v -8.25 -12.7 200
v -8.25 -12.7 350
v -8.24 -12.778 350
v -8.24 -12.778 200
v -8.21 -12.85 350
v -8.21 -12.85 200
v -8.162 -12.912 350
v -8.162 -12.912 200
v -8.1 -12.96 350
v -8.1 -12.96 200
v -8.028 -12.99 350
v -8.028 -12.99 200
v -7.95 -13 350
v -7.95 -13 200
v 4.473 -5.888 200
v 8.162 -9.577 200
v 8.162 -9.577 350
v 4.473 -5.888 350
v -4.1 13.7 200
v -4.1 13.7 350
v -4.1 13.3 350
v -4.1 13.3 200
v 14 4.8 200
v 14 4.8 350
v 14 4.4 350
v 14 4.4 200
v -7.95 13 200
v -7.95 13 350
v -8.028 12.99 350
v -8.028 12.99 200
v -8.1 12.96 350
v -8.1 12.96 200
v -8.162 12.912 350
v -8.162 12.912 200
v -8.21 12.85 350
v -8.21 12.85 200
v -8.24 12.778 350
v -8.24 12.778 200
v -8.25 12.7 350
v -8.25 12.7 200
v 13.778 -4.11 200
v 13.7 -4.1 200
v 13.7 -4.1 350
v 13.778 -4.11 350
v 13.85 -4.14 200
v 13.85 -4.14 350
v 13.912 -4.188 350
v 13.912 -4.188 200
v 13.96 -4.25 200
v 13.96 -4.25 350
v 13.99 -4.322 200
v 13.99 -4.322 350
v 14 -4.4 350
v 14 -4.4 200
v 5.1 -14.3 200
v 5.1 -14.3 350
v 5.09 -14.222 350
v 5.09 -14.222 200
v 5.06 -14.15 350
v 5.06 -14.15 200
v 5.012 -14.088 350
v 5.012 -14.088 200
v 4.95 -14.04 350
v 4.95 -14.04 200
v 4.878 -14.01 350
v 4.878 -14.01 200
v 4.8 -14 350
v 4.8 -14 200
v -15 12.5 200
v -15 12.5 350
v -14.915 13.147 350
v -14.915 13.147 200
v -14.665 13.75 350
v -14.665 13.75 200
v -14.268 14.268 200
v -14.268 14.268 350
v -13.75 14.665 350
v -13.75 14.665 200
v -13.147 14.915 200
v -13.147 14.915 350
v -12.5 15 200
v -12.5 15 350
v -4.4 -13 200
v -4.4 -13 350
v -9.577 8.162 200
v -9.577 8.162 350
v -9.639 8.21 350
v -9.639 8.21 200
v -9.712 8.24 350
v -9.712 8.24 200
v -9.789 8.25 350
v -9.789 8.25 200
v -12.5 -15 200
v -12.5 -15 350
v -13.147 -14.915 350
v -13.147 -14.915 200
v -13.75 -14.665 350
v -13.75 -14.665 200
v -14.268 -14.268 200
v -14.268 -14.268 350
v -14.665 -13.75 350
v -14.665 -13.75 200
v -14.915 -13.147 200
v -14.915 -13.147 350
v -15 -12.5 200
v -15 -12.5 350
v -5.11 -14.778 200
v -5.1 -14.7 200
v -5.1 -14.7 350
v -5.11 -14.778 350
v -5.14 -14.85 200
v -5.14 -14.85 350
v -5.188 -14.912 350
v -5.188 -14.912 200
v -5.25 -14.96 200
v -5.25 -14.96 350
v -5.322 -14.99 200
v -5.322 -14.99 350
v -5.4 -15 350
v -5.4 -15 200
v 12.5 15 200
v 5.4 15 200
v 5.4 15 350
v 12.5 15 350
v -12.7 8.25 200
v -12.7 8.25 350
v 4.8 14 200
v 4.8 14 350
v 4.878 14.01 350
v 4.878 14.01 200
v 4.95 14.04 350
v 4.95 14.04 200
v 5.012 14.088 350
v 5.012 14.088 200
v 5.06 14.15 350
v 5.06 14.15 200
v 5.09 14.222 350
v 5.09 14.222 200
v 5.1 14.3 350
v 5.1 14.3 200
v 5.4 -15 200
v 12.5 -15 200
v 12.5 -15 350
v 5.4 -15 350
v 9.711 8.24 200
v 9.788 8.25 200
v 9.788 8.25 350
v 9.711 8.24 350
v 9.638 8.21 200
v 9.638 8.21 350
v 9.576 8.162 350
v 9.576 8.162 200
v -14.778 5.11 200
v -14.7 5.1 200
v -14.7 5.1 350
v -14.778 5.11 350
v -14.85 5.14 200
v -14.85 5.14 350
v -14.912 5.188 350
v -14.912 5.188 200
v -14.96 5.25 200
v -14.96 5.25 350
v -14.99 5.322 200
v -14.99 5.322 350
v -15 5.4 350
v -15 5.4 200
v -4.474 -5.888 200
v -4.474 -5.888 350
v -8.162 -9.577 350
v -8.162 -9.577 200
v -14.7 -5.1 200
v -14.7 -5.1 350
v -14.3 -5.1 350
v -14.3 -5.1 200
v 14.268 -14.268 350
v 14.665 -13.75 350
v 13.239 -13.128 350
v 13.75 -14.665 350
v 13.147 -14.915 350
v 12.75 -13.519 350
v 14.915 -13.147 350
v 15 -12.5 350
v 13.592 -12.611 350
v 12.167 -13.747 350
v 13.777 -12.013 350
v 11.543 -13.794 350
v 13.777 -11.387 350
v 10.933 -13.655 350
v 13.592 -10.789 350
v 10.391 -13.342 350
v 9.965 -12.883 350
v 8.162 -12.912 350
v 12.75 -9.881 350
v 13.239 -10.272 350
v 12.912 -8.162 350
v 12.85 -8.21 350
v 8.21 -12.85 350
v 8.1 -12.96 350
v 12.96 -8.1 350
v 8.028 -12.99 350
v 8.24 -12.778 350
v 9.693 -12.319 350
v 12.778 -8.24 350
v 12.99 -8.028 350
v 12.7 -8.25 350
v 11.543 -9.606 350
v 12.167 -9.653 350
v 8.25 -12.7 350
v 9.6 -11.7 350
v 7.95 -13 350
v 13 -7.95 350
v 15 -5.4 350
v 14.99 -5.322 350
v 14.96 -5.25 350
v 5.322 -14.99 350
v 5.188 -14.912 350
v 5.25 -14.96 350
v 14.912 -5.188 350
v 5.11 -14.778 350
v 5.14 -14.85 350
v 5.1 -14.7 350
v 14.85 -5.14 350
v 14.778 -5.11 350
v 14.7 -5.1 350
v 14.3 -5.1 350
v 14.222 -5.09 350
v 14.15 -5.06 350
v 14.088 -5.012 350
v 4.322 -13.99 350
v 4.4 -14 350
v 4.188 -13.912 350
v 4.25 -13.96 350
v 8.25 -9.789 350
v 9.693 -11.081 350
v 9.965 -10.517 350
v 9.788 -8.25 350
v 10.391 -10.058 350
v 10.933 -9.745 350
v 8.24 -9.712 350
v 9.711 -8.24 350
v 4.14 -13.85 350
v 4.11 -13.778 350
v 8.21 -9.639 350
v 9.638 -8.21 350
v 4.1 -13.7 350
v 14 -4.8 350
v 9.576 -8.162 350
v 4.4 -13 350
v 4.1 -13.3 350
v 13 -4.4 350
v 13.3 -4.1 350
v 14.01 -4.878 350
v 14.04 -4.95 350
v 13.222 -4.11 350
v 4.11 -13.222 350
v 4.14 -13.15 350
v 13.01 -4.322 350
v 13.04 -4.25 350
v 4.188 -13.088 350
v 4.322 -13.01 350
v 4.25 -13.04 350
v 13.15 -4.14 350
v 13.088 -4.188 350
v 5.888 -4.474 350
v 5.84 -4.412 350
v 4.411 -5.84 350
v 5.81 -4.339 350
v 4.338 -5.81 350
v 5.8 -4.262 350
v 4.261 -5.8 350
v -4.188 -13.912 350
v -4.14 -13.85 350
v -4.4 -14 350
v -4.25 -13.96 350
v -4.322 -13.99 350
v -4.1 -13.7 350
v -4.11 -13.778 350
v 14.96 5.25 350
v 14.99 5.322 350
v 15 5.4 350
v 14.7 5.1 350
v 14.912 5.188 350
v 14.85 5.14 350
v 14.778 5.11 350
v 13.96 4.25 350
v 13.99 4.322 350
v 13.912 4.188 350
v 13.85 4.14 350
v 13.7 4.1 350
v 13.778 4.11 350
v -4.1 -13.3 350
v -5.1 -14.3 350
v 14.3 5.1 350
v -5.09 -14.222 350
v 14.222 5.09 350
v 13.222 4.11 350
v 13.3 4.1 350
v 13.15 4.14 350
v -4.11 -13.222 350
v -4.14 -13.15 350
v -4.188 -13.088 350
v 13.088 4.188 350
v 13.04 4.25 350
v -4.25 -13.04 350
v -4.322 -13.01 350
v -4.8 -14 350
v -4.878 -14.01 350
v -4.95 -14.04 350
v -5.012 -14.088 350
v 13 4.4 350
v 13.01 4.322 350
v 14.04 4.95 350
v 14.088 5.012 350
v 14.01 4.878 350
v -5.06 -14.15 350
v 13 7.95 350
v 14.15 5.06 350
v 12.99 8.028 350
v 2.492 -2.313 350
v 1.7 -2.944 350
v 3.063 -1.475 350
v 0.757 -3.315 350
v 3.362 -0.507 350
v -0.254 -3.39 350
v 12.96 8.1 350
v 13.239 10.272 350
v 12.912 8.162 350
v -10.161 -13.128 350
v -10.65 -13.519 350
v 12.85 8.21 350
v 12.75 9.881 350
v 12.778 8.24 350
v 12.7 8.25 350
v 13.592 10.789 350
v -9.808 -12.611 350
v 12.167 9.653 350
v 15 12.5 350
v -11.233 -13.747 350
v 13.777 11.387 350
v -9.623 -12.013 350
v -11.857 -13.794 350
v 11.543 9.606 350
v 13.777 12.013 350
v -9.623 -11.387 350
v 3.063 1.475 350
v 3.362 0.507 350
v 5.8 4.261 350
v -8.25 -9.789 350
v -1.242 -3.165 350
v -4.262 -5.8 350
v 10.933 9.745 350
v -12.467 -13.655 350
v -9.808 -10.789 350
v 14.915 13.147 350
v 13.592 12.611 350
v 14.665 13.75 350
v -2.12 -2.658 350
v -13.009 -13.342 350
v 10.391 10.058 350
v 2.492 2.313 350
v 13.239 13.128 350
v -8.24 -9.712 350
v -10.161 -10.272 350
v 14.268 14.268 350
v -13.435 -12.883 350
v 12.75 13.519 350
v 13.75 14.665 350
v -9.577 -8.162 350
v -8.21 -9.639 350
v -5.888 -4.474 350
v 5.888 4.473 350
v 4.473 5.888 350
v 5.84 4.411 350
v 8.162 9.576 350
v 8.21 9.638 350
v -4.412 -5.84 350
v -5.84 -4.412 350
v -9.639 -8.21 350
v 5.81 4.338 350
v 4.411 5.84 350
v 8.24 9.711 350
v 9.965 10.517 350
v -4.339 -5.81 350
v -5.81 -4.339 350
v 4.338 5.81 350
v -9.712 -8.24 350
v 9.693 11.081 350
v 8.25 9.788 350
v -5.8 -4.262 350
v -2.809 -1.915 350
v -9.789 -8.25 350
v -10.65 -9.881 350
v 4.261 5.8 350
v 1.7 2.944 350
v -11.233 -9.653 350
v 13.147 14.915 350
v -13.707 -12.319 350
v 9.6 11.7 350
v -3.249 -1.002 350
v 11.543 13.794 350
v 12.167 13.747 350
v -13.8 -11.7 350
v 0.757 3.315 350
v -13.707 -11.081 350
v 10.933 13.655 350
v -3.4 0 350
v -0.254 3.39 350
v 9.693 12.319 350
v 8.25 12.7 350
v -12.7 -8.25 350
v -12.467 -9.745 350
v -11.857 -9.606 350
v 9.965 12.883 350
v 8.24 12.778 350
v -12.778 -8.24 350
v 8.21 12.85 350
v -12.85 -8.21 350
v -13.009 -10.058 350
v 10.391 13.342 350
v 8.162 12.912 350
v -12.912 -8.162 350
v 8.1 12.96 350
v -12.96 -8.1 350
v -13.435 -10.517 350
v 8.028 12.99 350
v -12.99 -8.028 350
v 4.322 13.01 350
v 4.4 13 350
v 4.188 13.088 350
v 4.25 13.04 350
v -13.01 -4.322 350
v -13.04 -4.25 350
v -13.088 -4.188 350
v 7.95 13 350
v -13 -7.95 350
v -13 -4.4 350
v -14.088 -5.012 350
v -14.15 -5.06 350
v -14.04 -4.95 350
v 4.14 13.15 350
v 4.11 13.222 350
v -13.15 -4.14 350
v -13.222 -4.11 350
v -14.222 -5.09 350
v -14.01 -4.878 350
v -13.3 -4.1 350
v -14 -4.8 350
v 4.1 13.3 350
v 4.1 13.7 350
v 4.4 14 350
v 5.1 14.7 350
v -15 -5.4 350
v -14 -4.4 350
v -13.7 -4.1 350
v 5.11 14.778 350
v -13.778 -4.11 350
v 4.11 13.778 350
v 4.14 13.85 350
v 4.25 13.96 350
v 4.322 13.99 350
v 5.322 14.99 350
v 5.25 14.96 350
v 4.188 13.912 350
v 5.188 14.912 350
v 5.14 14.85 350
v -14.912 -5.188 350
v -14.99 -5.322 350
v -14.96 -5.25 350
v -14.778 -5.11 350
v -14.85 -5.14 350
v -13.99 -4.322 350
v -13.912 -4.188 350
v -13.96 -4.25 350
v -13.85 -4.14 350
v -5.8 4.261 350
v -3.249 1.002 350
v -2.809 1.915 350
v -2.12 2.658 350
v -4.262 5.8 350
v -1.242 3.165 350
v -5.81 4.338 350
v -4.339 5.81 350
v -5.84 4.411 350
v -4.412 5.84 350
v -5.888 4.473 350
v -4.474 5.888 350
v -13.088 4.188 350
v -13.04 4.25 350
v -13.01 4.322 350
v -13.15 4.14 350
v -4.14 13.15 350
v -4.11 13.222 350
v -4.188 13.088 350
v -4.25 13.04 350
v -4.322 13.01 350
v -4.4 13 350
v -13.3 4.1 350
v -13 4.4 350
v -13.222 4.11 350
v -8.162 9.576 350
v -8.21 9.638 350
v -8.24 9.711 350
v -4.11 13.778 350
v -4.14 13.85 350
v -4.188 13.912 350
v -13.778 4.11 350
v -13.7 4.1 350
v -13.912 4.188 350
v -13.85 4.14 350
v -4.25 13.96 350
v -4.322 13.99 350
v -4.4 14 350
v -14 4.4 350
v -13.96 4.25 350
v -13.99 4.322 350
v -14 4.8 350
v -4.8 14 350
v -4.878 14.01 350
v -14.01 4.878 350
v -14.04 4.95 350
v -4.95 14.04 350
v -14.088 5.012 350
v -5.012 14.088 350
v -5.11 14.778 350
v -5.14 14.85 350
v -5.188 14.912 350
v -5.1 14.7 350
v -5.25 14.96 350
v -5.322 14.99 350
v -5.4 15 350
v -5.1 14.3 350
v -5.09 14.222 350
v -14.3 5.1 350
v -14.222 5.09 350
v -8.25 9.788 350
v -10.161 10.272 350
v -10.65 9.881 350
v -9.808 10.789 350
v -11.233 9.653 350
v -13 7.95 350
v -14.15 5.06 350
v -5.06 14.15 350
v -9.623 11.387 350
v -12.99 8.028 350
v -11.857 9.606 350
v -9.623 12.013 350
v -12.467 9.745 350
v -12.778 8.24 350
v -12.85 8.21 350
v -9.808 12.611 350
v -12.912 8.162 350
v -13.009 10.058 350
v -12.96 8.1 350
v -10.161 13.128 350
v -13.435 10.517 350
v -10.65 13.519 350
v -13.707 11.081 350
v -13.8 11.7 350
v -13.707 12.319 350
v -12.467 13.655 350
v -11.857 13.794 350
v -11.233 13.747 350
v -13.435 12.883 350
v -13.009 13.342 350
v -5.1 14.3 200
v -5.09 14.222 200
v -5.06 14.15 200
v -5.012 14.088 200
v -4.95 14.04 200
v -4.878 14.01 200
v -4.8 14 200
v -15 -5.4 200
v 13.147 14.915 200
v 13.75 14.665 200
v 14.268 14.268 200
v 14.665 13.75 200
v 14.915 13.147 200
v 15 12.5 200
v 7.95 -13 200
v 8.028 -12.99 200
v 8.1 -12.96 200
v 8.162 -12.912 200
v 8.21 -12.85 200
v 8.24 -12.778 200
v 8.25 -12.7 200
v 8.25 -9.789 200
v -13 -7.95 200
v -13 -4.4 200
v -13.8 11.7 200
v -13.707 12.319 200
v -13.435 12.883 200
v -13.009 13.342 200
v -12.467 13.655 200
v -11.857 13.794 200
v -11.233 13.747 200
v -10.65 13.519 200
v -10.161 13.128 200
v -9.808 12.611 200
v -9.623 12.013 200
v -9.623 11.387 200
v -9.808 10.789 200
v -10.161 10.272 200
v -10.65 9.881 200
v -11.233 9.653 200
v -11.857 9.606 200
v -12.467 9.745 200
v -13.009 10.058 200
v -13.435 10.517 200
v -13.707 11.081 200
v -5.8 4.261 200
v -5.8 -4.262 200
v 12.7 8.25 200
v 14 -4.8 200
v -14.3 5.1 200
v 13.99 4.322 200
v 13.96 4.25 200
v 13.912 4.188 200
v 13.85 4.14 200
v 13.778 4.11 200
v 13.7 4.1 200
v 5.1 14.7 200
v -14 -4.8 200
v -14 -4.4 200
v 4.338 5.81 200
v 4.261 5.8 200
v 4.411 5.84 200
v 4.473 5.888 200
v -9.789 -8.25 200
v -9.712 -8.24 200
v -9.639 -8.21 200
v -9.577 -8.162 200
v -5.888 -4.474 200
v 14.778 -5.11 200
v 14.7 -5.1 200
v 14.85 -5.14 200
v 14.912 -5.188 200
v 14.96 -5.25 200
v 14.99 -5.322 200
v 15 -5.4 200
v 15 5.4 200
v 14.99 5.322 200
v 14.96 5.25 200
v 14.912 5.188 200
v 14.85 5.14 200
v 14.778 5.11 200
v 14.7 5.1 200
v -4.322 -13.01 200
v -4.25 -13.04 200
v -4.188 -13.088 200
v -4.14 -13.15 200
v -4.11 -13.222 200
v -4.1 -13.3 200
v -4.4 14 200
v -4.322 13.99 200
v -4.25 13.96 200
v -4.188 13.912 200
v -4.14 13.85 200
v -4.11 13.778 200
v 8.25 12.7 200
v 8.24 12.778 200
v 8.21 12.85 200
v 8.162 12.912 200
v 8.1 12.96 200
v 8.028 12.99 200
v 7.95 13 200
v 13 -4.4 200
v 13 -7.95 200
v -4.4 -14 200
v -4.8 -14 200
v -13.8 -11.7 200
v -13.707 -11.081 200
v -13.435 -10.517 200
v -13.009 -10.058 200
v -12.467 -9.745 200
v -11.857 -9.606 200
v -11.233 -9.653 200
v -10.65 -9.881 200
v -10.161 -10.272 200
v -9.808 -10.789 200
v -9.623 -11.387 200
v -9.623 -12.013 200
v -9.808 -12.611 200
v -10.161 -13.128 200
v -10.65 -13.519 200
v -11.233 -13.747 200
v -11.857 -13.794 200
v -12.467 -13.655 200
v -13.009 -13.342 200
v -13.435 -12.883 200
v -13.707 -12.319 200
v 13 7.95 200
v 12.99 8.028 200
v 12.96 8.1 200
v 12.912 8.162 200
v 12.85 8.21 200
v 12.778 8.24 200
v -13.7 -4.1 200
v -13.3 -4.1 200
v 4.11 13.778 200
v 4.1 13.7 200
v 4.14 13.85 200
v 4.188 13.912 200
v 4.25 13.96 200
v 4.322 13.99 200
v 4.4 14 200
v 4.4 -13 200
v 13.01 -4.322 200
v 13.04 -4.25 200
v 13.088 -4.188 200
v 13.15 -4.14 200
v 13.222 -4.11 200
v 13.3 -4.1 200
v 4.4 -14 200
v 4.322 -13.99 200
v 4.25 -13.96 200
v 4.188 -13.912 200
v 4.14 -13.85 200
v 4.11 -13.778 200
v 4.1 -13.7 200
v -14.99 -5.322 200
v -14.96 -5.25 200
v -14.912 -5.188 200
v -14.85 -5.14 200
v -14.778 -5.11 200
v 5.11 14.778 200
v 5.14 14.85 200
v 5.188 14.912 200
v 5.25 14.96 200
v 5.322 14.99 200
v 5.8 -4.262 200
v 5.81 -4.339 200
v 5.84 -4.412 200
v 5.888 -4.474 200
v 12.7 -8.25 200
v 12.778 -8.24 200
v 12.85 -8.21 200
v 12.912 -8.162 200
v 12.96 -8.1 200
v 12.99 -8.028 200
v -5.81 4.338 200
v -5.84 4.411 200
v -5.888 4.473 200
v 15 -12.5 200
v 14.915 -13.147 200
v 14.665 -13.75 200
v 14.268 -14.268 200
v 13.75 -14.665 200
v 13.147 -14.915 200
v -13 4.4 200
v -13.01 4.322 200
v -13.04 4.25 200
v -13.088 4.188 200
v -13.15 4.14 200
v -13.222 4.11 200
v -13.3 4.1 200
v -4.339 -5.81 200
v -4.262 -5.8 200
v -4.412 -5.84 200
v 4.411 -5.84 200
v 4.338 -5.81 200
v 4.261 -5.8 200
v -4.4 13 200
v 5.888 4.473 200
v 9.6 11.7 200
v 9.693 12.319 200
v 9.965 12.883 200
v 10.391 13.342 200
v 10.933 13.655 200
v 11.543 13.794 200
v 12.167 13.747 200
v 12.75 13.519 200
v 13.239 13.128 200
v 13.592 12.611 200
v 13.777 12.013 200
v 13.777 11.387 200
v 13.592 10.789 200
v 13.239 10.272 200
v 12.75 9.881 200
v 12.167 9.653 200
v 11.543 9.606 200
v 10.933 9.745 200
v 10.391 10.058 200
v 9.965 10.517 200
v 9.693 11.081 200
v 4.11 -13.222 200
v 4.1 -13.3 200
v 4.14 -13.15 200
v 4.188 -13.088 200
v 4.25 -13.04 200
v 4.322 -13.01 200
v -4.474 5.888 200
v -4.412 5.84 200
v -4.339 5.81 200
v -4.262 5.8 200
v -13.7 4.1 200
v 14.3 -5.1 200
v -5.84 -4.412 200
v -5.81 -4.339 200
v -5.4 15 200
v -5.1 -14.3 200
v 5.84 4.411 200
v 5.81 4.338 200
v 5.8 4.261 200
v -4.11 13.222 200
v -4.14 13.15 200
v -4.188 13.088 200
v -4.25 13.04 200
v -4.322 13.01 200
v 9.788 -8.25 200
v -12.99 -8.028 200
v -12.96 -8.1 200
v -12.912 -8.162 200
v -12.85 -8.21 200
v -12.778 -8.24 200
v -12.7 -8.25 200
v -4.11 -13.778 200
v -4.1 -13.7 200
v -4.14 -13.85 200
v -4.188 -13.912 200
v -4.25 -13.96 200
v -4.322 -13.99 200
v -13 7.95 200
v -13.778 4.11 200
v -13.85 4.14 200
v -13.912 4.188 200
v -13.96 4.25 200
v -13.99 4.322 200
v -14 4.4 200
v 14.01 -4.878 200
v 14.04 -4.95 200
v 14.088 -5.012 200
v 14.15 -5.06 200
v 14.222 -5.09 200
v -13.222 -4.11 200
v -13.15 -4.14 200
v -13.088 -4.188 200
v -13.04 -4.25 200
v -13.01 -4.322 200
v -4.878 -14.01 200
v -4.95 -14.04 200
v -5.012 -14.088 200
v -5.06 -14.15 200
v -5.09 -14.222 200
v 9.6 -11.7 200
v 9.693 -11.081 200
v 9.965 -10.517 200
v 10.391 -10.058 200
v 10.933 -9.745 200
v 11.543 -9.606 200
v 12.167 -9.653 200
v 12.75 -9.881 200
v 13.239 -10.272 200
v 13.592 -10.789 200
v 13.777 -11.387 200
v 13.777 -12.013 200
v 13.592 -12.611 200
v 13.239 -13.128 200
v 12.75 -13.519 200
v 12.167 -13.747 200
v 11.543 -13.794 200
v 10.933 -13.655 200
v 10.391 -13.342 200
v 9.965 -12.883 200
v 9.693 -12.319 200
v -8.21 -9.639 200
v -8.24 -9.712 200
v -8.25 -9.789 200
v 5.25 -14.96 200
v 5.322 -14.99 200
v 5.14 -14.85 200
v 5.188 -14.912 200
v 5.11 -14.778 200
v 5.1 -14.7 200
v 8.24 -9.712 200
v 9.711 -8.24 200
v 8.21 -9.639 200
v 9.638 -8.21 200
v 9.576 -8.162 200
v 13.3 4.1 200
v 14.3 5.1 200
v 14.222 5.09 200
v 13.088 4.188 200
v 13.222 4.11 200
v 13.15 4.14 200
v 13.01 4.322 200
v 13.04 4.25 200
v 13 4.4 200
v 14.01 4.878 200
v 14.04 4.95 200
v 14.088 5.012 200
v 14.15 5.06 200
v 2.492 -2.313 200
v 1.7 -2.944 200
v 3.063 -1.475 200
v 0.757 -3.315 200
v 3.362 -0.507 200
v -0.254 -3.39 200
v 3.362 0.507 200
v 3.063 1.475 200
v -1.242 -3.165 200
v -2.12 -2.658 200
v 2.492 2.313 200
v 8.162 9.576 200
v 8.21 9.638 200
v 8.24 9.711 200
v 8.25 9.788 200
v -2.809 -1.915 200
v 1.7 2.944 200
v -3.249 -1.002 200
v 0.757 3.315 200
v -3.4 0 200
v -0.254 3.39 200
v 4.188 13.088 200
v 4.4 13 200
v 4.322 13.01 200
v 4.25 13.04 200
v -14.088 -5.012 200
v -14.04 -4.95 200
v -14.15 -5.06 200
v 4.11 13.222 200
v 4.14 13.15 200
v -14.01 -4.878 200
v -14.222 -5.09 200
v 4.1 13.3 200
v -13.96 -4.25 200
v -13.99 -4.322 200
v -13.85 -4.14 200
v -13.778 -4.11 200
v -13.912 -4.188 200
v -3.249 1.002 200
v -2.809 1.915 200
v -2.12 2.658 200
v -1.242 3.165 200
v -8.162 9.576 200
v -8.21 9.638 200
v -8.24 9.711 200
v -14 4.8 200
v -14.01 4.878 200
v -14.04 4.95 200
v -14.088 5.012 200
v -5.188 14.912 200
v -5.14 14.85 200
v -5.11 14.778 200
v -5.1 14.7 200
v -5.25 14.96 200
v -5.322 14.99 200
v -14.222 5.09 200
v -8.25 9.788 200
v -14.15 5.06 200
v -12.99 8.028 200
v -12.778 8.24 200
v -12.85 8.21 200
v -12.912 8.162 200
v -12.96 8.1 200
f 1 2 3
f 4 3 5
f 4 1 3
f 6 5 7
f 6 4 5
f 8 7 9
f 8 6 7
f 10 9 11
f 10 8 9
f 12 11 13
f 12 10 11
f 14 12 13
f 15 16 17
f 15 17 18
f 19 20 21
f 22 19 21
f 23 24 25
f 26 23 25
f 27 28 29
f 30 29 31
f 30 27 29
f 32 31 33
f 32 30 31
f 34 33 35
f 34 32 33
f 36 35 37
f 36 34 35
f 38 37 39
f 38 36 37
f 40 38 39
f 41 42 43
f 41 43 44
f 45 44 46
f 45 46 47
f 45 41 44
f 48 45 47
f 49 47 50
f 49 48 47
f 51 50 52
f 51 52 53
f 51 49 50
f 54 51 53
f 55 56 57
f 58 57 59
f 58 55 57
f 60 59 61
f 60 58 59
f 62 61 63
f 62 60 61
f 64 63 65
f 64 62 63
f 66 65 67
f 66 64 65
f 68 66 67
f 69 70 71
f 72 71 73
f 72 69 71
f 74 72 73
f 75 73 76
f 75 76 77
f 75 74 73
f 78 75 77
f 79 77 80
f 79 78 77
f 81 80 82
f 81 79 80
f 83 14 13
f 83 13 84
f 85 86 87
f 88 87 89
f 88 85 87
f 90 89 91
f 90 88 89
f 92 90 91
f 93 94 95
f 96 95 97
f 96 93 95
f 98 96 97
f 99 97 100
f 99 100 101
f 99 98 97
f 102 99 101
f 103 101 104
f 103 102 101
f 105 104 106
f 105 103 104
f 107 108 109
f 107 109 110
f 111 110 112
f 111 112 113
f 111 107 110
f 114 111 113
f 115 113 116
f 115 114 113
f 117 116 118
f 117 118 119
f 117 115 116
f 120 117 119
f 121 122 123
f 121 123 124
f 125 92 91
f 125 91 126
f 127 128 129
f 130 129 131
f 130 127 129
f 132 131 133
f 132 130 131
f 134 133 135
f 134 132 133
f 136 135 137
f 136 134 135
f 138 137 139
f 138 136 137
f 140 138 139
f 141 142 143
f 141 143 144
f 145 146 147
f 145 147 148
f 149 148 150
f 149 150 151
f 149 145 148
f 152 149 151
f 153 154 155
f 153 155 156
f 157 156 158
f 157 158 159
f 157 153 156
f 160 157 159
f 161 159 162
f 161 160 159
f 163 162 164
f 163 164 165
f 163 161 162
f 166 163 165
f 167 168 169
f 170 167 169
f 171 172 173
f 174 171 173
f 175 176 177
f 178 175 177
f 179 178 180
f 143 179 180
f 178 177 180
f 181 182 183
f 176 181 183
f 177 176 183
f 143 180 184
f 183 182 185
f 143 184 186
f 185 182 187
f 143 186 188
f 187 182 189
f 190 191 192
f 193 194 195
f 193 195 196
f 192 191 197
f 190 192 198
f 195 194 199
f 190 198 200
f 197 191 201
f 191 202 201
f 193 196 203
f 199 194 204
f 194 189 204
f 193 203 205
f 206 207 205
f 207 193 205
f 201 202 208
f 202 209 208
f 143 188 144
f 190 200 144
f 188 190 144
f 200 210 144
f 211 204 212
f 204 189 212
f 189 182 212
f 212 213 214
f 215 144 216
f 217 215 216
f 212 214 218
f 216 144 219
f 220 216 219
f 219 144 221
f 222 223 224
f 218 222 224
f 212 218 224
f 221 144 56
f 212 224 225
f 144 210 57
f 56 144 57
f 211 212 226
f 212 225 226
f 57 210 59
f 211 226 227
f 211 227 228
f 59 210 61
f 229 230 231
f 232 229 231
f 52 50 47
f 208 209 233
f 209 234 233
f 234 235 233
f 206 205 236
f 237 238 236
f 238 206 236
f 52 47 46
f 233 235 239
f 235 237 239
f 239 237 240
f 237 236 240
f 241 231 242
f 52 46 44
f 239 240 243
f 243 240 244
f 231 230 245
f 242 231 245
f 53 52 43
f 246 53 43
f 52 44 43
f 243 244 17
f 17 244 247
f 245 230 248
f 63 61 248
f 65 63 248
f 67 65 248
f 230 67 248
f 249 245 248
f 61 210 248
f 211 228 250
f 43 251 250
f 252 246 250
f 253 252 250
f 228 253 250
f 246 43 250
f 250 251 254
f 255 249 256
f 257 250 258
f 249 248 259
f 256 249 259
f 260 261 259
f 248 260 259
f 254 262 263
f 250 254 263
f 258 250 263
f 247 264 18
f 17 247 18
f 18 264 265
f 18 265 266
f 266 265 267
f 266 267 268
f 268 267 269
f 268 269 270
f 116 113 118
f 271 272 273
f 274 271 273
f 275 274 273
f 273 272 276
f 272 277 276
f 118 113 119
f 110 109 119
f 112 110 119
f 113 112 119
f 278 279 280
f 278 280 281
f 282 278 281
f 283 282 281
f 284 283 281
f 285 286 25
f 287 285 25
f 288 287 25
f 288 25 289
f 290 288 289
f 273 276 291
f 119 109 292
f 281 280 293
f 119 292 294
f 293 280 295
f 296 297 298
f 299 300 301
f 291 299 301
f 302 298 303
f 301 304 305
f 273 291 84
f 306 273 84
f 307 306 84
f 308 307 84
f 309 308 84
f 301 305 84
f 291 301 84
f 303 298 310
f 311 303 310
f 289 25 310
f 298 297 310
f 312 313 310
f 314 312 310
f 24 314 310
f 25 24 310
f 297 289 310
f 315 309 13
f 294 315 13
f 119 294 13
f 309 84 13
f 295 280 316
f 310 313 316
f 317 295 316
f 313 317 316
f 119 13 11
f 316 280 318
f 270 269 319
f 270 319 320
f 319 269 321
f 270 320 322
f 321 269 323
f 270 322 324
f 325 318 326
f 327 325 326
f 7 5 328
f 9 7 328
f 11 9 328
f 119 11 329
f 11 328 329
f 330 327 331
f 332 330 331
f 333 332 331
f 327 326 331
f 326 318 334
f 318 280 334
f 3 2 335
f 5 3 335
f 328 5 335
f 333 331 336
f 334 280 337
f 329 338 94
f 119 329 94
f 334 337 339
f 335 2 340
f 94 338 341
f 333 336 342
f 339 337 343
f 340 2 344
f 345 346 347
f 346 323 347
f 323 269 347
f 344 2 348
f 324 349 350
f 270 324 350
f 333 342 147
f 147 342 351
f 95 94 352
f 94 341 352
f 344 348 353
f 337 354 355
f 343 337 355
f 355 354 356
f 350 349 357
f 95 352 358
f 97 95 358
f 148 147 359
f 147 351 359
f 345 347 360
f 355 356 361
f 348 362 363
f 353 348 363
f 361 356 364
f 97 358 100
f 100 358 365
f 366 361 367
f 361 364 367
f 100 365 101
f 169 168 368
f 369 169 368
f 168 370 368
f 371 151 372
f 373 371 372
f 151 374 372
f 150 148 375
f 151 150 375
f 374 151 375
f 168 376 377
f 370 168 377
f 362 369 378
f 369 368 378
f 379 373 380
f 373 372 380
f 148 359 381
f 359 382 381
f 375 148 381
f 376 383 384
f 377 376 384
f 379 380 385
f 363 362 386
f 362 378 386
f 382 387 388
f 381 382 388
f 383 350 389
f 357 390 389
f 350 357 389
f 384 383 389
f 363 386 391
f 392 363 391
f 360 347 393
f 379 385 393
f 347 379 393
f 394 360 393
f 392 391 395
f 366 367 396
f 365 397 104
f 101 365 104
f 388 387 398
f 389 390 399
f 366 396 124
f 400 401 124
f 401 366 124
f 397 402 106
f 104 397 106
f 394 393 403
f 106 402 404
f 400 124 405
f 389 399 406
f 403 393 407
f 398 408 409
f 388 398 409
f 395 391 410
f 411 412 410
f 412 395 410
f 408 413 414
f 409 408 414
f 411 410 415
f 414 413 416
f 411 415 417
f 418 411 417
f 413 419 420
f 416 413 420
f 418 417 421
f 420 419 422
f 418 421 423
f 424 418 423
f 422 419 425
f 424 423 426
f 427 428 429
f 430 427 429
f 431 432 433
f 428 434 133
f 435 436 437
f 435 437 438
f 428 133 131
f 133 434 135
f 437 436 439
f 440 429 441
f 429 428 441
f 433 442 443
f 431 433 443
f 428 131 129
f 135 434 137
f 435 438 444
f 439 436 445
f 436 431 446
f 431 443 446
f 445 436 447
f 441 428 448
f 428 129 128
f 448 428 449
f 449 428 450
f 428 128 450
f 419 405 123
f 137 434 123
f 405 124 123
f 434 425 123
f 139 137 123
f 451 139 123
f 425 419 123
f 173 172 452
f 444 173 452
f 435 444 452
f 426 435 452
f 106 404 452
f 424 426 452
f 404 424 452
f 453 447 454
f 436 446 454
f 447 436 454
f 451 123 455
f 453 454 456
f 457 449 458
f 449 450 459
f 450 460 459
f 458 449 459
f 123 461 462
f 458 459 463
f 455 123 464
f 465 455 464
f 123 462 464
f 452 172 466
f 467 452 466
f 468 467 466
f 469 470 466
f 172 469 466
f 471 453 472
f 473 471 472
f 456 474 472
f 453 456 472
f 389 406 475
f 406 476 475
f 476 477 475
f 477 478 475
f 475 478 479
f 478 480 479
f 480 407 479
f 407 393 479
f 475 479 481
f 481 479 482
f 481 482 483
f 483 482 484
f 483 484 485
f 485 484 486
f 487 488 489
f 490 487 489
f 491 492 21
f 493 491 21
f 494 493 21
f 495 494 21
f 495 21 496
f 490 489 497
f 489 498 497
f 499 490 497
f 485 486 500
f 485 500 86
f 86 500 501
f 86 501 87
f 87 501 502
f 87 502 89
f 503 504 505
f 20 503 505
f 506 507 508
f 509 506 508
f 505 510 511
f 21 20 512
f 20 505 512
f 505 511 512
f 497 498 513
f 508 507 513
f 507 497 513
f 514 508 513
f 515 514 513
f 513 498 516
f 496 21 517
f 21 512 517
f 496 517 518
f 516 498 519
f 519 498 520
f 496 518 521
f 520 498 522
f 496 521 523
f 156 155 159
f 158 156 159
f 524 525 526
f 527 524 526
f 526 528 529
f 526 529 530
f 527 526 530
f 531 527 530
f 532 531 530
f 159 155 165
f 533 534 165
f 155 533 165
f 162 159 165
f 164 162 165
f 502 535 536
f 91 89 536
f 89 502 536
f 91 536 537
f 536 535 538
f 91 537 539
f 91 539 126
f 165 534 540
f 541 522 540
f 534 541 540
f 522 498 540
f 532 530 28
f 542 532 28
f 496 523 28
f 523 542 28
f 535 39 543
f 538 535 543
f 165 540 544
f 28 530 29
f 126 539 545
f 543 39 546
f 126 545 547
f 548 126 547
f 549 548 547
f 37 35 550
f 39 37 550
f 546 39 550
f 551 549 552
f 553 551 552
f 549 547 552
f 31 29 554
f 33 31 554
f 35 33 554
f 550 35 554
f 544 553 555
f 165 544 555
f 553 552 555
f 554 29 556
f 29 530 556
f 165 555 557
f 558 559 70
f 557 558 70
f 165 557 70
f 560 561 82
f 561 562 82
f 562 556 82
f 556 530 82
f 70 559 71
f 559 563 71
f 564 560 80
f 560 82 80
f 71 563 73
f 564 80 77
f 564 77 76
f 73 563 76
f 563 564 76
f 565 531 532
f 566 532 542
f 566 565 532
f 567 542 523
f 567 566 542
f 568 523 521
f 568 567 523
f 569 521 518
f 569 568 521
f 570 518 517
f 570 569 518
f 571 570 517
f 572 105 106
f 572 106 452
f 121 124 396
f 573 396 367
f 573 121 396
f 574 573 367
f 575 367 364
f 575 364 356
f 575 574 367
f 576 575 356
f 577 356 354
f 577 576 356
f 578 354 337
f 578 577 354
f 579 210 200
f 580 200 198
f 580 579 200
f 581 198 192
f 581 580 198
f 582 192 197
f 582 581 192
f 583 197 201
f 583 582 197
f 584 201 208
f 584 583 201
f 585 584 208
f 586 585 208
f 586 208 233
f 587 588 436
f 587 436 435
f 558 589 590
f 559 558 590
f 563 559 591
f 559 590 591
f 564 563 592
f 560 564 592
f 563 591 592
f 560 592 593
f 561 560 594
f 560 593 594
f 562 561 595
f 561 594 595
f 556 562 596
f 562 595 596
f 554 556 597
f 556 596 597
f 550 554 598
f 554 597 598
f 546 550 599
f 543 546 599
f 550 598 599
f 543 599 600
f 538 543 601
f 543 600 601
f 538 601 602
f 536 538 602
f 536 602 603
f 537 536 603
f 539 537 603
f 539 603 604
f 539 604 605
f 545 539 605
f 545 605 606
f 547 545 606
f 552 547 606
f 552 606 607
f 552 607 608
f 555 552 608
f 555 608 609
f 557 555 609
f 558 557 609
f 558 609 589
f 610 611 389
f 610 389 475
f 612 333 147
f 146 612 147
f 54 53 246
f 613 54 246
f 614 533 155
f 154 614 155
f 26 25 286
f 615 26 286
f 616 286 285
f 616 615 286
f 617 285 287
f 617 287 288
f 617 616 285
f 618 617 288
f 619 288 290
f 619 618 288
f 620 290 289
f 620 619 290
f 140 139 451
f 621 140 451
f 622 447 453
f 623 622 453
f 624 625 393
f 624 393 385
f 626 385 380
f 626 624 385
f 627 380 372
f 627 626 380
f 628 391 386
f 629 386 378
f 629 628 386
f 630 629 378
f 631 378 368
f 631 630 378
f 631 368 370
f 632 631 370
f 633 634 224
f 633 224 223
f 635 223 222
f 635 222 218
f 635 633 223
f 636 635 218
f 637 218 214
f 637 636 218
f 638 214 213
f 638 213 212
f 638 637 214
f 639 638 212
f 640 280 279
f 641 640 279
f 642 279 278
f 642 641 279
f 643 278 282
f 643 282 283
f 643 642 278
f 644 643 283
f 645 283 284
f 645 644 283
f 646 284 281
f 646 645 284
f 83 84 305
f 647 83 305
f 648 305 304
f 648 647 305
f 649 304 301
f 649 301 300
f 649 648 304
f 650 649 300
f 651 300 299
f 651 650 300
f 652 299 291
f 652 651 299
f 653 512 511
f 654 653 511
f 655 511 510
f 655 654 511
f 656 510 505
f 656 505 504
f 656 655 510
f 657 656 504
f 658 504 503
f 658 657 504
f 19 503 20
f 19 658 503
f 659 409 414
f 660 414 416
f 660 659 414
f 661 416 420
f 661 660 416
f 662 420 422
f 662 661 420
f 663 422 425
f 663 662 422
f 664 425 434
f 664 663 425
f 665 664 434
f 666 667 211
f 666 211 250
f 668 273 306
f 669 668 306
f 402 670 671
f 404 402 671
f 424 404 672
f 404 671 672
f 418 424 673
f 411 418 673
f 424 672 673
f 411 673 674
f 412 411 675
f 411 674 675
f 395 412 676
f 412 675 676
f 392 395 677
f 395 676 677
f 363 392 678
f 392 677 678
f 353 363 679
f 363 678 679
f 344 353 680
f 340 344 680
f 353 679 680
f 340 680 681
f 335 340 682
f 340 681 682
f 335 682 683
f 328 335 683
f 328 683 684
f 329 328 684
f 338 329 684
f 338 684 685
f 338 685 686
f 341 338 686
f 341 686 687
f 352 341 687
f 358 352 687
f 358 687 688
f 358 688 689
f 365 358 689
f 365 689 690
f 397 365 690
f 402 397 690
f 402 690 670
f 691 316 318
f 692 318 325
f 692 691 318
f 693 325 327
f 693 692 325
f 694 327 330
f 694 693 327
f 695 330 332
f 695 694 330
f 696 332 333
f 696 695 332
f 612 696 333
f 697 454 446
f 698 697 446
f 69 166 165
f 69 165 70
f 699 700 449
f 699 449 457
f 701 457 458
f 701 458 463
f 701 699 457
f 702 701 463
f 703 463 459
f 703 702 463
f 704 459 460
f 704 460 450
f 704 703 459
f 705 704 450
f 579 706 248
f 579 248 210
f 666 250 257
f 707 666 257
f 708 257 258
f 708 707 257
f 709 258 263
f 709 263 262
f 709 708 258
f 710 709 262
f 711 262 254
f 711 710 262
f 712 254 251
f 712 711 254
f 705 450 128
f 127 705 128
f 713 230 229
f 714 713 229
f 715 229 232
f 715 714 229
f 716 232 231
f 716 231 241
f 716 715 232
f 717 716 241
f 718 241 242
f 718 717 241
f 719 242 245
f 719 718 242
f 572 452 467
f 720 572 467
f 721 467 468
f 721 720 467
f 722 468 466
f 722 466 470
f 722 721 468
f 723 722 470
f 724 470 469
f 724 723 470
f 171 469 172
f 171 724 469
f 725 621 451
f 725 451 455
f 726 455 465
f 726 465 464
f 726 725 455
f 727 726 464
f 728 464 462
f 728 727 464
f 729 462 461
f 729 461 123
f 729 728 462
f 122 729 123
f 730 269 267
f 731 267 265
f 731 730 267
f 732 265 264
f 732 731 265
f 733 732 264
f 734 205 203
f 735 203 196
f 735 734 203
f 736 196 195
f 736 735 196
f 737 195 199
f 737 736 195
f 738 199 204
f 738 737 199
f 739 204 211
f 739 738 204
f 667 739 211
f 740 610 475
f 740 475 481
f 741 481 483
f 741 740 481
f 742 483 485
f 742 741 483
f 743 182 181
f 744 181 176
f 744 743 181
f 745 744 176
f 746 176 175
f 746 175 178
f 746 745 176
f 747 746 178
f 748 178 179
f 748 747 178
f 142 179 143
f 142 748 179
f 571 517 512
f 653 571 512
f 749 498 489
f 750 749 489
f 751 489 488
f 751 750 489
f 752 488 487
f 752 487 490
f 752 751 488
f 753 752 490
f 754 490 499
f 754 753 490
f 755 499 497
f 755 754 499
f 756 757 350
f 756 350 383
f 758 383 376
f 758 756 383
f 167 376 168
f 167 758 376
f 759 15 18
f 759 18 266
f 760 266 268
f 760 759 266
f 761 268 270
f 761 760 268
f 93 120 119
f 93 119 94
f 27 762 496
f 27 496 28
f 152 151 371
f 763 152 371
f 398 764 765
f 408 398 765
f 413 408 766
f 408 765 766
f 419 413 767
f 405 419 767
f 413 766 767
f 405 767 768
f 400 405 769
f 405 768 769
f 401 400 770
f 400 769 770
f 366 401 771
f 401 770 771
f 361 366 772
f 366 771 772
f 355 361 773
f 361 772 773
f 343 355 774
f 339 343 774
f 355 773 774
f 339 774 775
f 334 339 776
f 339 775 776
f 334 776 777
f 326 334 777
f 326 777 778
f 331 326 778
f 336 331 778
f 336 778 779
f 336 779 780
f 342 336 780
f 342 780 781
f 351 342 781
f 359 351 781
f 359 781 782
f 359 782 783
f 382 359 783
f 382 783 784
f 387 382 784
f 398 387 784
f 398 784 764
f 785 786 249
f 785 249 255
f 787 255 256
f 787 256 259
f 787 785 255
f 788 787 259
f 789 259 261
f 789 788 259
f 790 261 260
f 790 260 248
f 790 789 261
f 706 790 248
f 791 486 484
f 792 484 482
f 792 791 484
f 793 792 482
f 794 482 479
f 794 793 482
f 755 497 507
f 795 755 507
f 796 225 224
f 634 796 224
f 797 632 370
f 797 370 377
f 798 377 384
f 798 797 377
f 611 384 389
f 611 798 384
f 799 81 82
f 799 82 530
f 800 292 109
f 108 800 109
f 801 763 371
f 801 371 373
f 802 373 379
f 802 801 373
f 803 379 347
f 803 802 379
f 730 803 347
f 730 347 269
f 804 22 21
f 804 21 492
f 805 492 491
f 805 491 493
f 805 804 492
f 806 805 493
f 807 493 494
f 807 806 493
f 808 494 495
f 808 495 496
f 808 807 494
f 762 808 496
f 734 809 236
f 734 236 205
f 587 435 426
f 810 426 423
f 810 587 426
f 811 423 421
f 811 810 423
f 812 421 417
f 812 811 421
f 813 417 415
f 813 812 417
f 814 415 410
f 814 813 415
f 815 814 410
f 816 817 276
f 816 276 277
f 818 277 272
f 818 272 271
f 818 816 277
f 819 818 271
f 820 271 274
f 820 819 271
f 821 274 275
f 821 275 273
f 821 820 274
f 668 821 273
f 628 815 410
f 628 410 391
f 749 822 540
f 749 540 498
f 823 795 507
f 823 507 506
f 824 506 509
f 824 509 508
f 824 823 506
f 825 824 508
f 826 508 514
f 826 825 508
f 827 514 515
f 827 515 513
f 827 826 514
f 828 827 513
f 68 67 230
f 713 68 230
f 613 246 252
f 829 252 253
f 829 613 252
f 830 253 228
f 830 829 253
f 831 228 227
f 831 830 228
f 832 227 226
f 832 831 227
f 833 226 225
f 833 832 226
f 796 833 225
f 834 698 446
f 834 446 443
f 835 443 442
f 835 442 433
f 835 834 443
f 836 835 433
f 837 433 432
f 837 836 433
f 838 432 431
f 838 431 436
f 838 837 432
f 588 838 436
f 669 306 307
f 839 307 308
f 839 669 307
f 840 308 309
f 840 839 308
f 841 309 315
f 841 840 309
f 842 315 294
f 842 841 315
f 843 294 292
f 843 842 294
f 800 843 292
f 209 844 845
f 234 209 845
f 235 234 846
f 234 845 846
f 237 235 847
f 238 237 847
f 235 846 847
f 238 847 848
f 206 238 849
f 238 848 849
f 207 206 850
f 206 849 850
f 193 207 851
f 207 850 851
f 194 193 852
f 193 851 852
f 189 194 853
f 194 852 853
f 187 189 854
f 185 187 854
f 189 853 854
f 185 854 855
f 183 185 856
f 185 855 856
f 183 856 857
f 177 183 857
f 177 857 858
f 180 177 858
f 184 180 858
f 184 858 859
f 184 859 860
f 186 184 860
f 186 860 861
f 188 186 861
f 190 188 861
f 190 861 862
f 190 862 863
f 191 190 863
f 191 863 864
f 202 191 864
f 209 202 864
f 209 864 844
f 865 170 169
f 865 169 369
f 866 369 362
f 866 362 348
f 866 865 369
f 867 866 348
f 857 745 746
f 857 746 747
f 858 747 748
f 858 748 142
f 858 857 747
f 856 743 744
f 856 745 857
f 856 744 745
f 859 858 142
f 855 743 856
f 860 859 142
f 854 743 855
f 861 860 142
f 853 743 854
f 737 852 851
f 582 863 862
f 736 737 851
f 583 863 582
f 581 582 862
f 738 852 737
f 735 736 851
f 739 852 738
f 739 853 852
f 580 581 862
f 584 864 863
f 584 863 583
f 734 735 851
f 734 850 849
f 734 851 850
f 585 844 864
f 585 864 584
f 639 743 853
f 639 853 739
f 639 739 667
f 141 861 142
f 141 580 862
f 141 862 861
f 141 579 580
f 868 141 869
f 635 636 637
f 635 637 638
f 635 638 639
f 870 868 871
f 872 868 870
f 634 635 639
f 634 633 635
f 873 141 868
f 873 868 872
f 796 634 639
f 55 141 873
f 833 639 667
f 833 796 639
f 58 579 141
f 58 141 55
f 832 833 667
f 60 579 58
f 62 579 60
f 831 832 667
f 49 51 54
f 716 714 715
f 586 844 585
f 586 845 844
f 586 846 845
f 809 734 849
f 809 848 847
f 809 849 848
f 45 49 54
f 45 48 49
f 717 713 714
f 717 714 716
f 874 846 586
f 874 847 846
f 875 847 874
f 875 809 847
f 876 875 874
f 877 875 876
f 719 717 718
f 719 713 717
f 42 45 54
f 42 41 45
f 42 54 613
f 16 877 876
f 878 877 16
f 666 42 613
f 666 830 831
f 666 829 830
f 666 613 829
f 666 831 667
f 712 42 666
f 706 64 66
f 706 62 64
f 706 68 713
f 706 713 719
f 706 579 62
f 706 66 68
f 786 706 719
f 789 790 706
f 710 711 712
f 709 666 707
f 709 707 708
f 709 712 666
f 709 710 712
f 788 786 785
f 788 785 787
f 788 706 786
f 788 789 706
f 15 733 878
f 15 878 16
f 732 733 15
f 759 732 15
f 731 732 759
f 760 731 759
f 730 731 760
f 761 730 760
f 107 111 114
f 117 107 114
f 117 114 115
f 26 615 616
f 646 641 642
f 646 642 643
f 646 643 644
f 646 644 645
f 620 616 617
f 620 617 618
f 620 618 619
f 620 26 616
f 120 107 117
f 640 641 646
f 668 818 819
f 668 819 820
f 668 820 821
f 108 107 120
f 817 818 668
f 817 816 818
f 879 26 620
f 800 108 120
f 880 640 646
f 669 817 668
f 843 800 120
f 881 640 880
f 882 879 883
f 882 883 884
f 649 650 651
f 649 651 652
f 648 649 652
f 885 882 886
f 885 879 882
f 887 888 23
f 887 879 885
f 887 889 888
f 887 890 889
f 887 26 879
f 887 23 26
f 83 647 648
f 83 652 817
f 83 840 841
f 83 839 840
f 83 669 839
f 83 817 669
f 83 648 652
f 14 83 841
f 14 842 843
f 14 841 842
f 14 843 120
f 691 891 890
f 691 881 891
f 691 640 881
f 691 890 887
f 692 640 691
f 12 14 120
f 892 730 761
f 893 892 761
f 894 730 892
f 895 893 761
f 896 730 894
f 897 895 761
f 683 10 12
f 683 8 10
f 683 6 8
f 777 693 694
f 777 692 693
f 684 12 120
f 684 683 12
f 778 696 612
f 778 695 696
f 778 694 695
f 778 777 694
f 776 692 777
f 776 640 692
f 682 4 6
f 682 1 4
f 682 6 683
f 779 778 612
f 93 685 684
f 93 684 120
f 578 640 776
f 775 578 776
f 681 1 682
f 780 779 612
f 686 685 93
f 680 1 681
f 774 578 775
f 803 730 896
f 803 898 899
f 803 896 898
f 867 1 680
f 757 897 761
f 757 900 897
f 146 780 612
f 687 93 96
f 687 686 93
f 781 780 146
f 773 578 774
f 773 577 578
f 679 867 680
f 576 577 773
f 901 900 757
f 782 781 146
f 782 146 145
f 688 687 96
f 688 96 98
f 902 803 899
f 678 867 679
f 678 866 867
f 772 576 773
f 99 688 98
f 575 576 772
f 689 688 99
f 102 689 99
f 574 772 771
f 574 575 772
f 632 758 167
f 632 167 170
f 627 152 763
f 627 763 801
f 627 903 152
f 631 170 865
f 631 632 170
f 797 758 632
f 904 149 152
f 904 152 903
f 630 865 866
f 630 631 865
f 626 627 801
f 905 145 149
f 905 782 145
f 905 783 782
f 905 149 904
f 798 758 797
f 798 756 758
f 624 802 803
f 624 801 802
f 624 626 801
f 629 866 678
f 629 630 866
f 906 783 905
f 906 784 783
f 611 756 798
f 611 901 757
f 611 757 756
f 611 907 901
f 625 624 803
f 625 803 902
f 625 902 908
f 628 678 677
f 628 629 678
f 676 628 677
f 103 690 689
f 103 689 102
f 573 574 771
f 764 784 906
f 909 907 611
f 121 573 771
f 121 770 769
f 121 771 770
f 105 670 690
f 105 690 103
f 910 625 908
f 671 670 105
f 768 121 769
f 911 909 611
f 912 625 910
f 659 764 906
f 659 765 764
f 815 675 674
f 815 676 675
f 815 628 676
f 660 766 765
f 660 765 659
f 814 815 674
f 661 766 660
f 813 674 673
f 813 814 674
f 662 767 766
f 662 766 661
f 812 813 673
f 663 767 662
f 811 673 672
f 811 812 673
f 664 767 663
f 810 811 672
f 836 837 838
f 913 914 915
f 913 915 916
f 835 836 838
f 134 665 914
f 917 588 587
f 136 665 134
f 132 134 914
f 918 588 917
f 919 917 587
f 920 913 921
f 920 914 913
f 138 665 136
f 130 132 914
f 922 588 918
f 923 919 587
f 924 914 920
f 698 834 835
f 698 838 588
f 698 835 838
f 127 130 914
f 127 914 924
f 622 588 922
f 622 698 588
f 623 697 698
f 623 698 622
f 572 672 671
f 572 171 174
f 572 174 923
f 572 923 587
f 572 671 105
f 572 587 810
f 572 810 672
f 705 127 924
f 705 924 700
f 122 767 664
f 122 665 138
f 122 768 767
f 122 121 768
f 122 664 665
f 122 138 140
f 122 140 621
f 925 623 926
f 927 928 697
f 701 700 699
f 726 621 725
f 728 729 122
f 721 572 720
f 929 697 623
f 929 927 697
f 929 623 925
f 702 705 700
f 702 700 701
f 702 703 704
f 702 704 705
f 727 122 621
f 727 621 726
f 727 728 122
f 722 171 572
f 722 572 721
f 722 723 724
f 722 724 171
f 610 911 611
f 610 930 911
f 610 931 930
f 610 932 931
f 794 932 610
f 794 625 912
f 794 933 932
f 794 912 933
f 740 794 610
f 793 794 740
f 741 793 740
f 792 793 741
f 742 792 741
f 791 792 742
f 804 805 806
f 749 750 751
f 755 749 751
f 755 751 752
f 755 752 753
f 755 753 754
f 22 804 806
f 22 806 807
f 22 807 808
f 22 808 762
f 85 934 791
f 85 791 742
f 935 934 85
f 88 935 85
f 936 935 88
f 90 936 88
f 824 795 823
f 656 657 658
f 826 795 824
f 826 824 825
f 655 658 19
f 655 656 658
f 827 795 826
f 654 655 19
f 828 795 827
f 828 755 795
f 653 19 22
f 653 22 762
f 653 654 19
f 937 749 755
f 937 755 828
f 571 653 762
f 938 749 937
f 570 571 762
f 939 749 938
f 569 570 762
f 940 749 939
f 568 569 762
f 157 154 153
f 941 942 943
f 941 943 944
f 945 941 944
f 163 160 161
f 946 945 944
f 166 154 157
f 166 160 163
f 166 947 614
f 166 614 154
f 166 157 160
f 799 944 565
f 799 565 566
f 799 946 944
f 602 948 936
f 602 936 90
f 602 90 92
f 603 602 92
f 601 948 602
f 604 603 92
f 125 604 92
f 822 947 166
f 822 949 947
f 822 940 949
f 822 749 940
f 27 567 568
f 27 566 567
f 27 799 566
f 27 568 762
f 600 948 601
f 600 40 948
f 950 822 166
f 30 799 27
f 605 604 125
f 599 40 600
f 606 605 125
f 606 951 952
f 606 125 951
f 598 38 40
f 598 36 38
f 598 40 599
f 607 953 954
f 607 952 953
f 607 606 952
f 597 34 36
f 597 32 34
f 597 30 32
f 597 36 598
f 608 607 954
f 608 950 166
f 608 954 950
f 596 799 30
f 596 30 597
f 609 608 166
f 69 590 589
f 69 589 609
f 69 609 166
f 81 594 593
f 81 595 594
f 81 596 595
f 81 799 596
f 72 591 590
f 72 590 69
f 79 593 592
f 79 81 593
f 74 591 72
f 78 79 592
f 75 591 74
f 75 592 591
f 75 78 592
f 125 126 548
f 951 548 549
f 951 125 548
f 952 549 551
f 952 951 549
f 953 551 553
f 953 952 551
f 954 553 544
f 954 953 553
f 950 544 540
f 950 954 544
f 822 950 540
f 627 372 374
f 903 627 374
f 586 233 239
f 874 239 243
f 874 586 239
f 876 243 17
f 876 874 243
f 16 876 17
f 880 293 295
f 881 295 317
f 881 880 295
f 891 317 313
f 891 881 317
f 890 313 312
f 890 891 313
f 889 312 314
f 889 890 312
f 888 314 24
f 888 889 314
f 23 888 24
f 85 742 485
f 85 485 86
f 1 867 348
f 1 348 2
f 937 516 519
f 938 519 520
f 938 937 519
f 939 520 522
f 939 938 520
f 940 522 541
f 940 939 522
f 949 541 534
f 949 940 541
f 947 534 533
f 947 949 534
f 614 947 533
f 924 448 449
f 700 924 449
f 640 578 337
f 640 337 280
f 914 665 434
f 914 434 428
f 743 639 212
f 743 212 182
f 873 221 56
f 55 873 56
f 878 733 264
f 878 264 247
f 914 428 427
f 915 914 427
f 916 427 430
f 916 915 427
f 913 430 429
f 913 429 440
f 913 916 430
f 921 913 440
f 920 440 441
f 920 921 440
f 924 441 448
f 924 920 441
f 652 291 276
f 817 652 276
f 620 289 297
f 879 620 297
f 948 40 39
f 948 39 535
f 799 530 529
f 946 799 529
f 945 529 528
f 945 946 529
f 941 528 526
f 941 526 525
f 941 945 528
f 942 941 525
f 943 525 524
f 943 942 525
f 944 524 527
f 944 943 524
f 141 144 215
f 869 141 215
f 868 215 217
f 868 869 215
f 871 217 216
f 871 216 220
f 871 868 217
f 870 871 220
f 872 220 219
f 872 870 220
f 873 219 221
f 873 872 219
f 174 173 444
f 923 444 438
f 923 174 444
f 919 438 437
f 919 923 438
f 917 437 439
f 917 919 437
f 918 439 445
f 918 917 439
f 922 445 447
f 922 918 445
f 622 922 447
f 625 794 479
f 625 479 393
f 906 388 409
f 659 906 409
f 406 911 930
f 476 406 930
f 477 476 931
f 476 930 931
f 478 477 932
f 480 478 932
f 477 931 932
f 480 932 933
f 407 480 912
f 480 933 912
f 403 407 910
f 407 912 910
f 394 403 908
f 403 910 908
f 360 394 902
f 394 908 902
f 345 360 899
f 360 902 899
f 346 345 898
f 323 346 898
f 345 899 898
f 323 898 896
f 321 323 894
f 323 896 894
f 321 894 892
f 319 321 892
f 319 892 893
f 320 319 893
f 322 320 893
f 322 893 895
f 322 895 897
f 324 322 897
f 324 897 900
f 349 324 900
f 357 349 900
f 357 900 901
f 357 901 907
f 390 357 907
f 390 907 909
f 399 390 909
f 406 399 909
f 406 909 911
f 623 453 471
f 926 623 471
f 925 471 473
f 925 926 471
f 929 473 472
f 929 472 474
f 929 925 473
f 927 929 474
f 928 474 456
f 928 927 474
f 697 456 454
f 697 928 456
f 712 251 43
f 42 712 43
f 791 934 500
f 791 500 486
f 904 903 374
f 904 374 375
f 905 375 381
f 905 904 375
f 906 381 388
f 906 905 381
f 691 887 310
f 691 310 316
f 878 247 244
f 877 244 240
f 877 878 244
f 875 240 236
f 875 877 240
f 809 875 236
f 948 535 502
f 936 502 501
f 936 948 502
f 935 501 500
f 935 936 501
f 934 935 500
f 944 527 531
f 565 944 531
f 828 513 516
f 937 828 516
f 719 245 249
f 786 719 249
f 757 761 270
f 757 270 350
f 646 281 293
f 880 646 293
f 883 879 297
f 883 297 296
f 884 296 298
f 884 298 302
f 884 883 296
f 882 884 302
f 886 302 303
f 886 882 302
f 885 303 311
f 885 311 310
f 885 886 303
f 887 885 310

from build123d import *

# Parameters (mm, degrees)
CROQUIS1_R              = 2.1
CROQUIS1_R_2            = 3.4
SALIENTE_EXTRUIR1_DEPTH = 400
CROQUIS2_W              = 39.308064919
CROQUIS2_H              = 32.219725343
CORTAR_EXTRUIR1_DEPTH   = 250


with BuildPart() as part:
    # Croquis1 → Saliente-Extruir1 (new body)
    with BuildSketch(Plane(origin=(0, 0, -50), x_dir=(-1, 0, 0), z_dir=(0, 0, -1))):
        with BuildLine():
            Line((14.7, -5.1), (14.3, -5.1))
            ThreePointArc((14.3, -5.1), (14.087867966, -5.012132034), (14, -4.8))
            Line((14, -4.8), (14, -4.4))
            ThreePointArc((14, -4.4), (13.912132034, -4.187867966), (13.7, -4.1))
            Line((13.7, -4.1), (13.3, -4.1))
            ThreePointArc((13.3, -4.1), (13.087867966, -4.187867966), (13, -4.4))
            Line((13, -4.4), (13, -7.95))
            ThreePointArc((13, -7.95), (12.912132034, -8.162132034), (12.7, -8.25))
            Line((12.7, -8.25), (9.789264108, -8.25))
            ThreePointArc((9.789264108, -8.25), (9.674477865, -8.22717164), (9.577160832, -8.162160788))
            Line((9.577160832, -8.162160788), (5.887896723, -4.473896751))
            ThreePointArc((5.887896723, -4.473896751), (5.822843922, -4.376559778), (5.8, -4.261735963))
            Line((5.8, -4.261735963), (5.8, 4.260735931))
            ThreePointArc((5.8, 4.260735931), (5.82283614, 4.375540961), (5.887867966, 4.472867966))
            Line((5.887867966, 4.472867966), (9.577132034, 8.162132034))
            ThreePointArc((9.577132034, 8.162132034), (9.674459039, 8.22716386), (9.789264069, 8.25))
            Line((9.789264069, 8.25), (12.7, 8.25))
            ThreePointArc((12.7, 8.25), (12.912132034, 8.162132034), (13, 7.95))
            Line((13, 7.95), (13, 4.4))
            ThreePointArc((13, 4.4), (13.087867966, 4.187867966), (13.3, 4.1))
            Line((13.3, 4.1), (13.7, 4.1))
            ThreePointArc((13.7, 4.1), (13.912132034, 4.187867966), (14, 4.4))
            Line((14, 4.4), (14, 4.8))
            ThreePointArc((14, 4.8), (14.087867966, 5.012132034), (14.3, 5.1))
            Line((14.3, 5.1), (14.7, 5.1))
            ThreePointArc((14.7, 5.1), (14.912132034, 5.187867966), (15, 5.4))
            Line((15, 5.4), (15, 12.5))
            ThreePointArc((15, 12.5), (14.267766953, 14.267766953), (12.5, 15))
            Line((12.5, 15), (5.4, 15))
            ThreePointArc((5.4, 15), (5.187867966, 14.912132034), (5.1, 14.7))
            Line((5.1, 14.7), (5.1, 14.3))
            ThreePointArc((5.1, 14.3), (5.012132034, 14.087867966), (4.8, 14))
            Line((4.8, 14), (4.4, 14))
            ThreePointArc((4.4, 14), (4.187867966, 13.912132034), (4.1, 13.7))
            Line((4.1, 13.7), (4.1, 13.3))
            ThreePointArc((4.1, 13.3), (4.187867966, 13.087867966), (4.4, 13))
            Line((4.4, 13), (7.95, 13))
            ThreePointArc((7.95, 13), (8.162132034, 12.912132034), (8.25, 12.7))
            Line((8.25, 12.7), (8.25, 9.788264069))
            ThreePointArc((8.25, 9.788264069), (8.22716386, 9.673459039), (8.162132034, 9.576132034))
            Line((8.162132034, 9.576132034), (4.473867966, 5.887867966))
            ThreePointArc((4.473867966, 5.887867966), (4.376540961, 5.82283614), (4.261735931, 5.8))
            Line((4.261735931, 5.8), (-4.260735892, 5.8))
            ThreePointArc((-4.260735892, 5.8), (-4.375522135, 5.82282836), (-4.472839168, 5.887839212))
            Line((-4.472839168, 5.887839212), (-8.162103277, 9.576103249))
            ThreePointArc((-8.162103277, 9.576103249), (-8.227156078, 9.673440222), (-8.25, 9.788264037))
            Line((-8.25, 9.788264037), (-8.25, 12.7))
            ThreePointArc((-8.25, 12.7), (-8.162132034, 12.912132034), (-7.95, 13))
            Line((-7.95, 13), (-4.4, 13))
            ThreePointArc((-4.4, 13), (-4.187867966, 13.087867966), (-4.1, 13.3))
            Line((-4.1, 13.3), (-4.1, 13.7))
            ThreePointArc((-4.1, 13.7), (-4.187867966, 13.912132034), (-4.4, 14))
            Line((-4.4, 14), (-4.8, 14))
            ThreePointArc((-4.8, 14), (-5.012132034, 14.087867966), (-5.1, 14.3))
            Line((-5.1, 14.3), (-5.1, 14.7))
            ThreePointArc((-5.1, 14.7), (-5.187867966, 14.912132034), (-5.4, 15))
            Line((-5.4, 15), (-12.5, 15))
            ThreePointArc((-12.5, 15), (-14.267766953, 14.267766953), (-15, 12.5))
            Line((-15, 12.5), (-15, 5.4))
            ThreePointArc((-15, 5.4), (-14.912132034, 5.187867966), (-14.7, 5.1))
            Line((-14.7, 5.1), (-14.3, 5.1))
            ThreePointArc((-14.3, 5.1), (-14.087867966, 5.012132034), (-14, 4.8))
            Line((-14, 4.8), (-14, 4.4))
            ThreePointArc((-14, 4.4), (-13.912132034, 4.187867966), (-13.7, 4.1))
            Line((-13.7, 4.1), (-13.3, 4.1))
            ThreePointArc((-13.3, 4.1), (-13.087867966, 4.187867966), (-13, 4.4))
            Line((-13, 4.4), (-13, 7.95))
            ThreePointArc((-13, 7.95), (-12.912132034, 8.162132034), (-12.7, 8.25))
            Line((-12.7, 8.25), (-9.788264037, 8.25))
            ThreePointArc((-9.788264037, 8.25), (-9.673440222, 8.227156078), (-9.576103249, 8.162103277))
            Line((-9.576103249, 8.162103277), (-5.887839212, 4.472839168))
            ThreePointArc((-5.887839212, 4.472839168), (-5.82282836, 4.375522135), (-5.8, 4.260735892))
            Line((-5.8, 4.260735892), (-5.8, -4.261735931))
            ThreePointArc((-5.8, -4.261735931), (-5.82283614, -4.376540961), (-5.887867966, -4.473867966))
            Line((-5.887867966, -4.473867966), (-9.576132034, -8.162132034))
            ThreePointArc((-9.576132034, -8.162132034), (-9.673459039, -8.22716386), (-9.788264069, -8.25))
            Line((-9.788264069, -8.25), (-12.7, -8.25))
            ThreePointArc((-12.7, -8.25), (-12.912132034, -8.162132034), (-13, -7.95))
            Line((-13, -7.95), (-13, -4.4))
            ThreePointArc((-13, -4.4), (-13.087867966, -4.187867966), (-13.3, -4.1))
            Line((-13.3, -4.1), (-13.7, -4.1))
            ThreePointArc((-13.7, -4.1), (-13.912132034, -4.187867966), (-14, -4.4))
            Line((-14, -4.4), (-14, -4.8))
            ThreePointArc((-14, -4.8), (-14.087867966, -5.012132034), (-14.3, -5.1))
            Line((-14.3, -5.1), (-14.7, -5.1))
            ThreePointArc((-14.7, -5.1), (-14.912132034, -5.187867966), (-15, -5.4))
            Line((-15, -5.4), (-15, -12.5))
            ThreePointArc((-15, -12.5), (-14.267766953, -14.267766953), (-12.5, -15))
            Line((-12.5, -15), (-5.4, -15))
            ThreePointArc((-5.4, -15), (-5.187867966, -14.912132034), (-5.1, -14.7))
            Line((-5.1, -14.7), (-5.1, -14.3))
            ThreePointArc((-5.1, -14.3), (-5.012132034, -14.087867966), (-4.8, -14))
            Line((-4.8, -14), (-4.4, -14))
            ThreePointArc((-4.4, -14), (-4.187867966, -13.912132034), (-4.1, -13.7))
            Line((-4.1, -13.7), (-4.1, -13.3))
            ThreePointArc((-4.1, -13.3), (-4.187867966, -13.087867966), (-4.4, -13))
            Line((-4.4, -13), (-7.95, -13))
            ThreePointArc((-7.95, -13), (-8.162132034, -12.912132034), (-8.25, -12.7))
            Line((-8.25, -12.7), (-8.25, -9.789264069))
            ThreePointArc((-8.25, -9.789264069), (-8.22716386, -9.674459039), (-8.162132034, -9.577132034))
            Line((-8.162132034, -9.577132034), (-4.472867966, -5.887867966))
            ThreePointArc((-4.472867966, -5.887867966), (-4.375540961, -5.82283614), (-4.260735931, -5.8))
            Line((-4.260735931, -5.8), (4.261735963, -5.8))
            ThreePointArc((4.261735963, -5.8), (4.376559778, -5.822843922), (4.473896751, -5.887896723))
            Line((4.473896751, -5.887896723), (8.162160788, -9.577160832))
            ThreePointArc((8.162160788, -9.577160832), (8.22717164, -9.674477865), (8.25, -9.789264108))
            Line((8.25, -9.789264108), (8.25, -12.7))
            ThreePointArc((8.25, -12.7), (8.162132034, -12.912132034), (7.95, -13))
            Line((7.95, -13), (4.4, -13))
            ThreePointArc((4.4, -13), (4.187867966, -13.087867966), (4.1, -13.3))
            Line((4.1, -13.3), (4.1, -13.7))
            ThreePointArc((4.1, -13.7), (4.187867966, -13.912132034), (4.4, -14))
            Line((4.4, -14), (4.8, -14))
            ThreePointArc((4.8, -14), (5.012132034, -14.087867966), (5.1, -14.3))
            Line((5.1, -14.3), (5.1, -14.7))
            ThreePointArc((5.1, -14.7), (5.187867966, -14.912132034), (5.4, -15))
            Line((5.4, -15), (12.5, -15))
            ThreePointArc((12.5, -15), (14.267766953, -14.267766953), (15, -12.5))
            Line((15, -12.5), (15, -5.4))
            ThreePointArc((15, -5.4), (14.912132034, -5.187867966), (14.7, -5.1))
        make_face()
        with Locations((-11.7, 11.7)):
            Circle(CROQUIS1_R, mode=Mode.SUBTRACT)
        with Locations((-11.7, -11.7)):
            Circle(CROQUIS1_R, mode=Mode.SUBTRACT)
        Circle(CROQUIS1_R_2, mode=Mode.SUBTRACT)
        with Locations((11.7, 11.7)):
            Circle(CROQUIS1_R, mode=Mode.SUBTRACT)
        with Locations((11.7, -11.7)):
            Circle(CROQUIS1_R, mode=Mode.SUBTRACT)
    extrude(amount=-SALIENTE_EXTRUIR1_DEPTH)

    # Croquis2 → Cortar-Extruir1 (cut)
    with BuildSketch(Plane(origin=(0, 0, -50), x_dir=(-1, 0, 0), z_dir=(0, 0, -1))):
        with Locations((0.664531836, 0.281922596)):
            Rectangle(CROQUIS2_W, CROQUIS2_H)
    extrude(amount=-CORTAR_EXTRUIR1_DEPTH, mode=Mode.SUBTRACT)


solid = part.part
